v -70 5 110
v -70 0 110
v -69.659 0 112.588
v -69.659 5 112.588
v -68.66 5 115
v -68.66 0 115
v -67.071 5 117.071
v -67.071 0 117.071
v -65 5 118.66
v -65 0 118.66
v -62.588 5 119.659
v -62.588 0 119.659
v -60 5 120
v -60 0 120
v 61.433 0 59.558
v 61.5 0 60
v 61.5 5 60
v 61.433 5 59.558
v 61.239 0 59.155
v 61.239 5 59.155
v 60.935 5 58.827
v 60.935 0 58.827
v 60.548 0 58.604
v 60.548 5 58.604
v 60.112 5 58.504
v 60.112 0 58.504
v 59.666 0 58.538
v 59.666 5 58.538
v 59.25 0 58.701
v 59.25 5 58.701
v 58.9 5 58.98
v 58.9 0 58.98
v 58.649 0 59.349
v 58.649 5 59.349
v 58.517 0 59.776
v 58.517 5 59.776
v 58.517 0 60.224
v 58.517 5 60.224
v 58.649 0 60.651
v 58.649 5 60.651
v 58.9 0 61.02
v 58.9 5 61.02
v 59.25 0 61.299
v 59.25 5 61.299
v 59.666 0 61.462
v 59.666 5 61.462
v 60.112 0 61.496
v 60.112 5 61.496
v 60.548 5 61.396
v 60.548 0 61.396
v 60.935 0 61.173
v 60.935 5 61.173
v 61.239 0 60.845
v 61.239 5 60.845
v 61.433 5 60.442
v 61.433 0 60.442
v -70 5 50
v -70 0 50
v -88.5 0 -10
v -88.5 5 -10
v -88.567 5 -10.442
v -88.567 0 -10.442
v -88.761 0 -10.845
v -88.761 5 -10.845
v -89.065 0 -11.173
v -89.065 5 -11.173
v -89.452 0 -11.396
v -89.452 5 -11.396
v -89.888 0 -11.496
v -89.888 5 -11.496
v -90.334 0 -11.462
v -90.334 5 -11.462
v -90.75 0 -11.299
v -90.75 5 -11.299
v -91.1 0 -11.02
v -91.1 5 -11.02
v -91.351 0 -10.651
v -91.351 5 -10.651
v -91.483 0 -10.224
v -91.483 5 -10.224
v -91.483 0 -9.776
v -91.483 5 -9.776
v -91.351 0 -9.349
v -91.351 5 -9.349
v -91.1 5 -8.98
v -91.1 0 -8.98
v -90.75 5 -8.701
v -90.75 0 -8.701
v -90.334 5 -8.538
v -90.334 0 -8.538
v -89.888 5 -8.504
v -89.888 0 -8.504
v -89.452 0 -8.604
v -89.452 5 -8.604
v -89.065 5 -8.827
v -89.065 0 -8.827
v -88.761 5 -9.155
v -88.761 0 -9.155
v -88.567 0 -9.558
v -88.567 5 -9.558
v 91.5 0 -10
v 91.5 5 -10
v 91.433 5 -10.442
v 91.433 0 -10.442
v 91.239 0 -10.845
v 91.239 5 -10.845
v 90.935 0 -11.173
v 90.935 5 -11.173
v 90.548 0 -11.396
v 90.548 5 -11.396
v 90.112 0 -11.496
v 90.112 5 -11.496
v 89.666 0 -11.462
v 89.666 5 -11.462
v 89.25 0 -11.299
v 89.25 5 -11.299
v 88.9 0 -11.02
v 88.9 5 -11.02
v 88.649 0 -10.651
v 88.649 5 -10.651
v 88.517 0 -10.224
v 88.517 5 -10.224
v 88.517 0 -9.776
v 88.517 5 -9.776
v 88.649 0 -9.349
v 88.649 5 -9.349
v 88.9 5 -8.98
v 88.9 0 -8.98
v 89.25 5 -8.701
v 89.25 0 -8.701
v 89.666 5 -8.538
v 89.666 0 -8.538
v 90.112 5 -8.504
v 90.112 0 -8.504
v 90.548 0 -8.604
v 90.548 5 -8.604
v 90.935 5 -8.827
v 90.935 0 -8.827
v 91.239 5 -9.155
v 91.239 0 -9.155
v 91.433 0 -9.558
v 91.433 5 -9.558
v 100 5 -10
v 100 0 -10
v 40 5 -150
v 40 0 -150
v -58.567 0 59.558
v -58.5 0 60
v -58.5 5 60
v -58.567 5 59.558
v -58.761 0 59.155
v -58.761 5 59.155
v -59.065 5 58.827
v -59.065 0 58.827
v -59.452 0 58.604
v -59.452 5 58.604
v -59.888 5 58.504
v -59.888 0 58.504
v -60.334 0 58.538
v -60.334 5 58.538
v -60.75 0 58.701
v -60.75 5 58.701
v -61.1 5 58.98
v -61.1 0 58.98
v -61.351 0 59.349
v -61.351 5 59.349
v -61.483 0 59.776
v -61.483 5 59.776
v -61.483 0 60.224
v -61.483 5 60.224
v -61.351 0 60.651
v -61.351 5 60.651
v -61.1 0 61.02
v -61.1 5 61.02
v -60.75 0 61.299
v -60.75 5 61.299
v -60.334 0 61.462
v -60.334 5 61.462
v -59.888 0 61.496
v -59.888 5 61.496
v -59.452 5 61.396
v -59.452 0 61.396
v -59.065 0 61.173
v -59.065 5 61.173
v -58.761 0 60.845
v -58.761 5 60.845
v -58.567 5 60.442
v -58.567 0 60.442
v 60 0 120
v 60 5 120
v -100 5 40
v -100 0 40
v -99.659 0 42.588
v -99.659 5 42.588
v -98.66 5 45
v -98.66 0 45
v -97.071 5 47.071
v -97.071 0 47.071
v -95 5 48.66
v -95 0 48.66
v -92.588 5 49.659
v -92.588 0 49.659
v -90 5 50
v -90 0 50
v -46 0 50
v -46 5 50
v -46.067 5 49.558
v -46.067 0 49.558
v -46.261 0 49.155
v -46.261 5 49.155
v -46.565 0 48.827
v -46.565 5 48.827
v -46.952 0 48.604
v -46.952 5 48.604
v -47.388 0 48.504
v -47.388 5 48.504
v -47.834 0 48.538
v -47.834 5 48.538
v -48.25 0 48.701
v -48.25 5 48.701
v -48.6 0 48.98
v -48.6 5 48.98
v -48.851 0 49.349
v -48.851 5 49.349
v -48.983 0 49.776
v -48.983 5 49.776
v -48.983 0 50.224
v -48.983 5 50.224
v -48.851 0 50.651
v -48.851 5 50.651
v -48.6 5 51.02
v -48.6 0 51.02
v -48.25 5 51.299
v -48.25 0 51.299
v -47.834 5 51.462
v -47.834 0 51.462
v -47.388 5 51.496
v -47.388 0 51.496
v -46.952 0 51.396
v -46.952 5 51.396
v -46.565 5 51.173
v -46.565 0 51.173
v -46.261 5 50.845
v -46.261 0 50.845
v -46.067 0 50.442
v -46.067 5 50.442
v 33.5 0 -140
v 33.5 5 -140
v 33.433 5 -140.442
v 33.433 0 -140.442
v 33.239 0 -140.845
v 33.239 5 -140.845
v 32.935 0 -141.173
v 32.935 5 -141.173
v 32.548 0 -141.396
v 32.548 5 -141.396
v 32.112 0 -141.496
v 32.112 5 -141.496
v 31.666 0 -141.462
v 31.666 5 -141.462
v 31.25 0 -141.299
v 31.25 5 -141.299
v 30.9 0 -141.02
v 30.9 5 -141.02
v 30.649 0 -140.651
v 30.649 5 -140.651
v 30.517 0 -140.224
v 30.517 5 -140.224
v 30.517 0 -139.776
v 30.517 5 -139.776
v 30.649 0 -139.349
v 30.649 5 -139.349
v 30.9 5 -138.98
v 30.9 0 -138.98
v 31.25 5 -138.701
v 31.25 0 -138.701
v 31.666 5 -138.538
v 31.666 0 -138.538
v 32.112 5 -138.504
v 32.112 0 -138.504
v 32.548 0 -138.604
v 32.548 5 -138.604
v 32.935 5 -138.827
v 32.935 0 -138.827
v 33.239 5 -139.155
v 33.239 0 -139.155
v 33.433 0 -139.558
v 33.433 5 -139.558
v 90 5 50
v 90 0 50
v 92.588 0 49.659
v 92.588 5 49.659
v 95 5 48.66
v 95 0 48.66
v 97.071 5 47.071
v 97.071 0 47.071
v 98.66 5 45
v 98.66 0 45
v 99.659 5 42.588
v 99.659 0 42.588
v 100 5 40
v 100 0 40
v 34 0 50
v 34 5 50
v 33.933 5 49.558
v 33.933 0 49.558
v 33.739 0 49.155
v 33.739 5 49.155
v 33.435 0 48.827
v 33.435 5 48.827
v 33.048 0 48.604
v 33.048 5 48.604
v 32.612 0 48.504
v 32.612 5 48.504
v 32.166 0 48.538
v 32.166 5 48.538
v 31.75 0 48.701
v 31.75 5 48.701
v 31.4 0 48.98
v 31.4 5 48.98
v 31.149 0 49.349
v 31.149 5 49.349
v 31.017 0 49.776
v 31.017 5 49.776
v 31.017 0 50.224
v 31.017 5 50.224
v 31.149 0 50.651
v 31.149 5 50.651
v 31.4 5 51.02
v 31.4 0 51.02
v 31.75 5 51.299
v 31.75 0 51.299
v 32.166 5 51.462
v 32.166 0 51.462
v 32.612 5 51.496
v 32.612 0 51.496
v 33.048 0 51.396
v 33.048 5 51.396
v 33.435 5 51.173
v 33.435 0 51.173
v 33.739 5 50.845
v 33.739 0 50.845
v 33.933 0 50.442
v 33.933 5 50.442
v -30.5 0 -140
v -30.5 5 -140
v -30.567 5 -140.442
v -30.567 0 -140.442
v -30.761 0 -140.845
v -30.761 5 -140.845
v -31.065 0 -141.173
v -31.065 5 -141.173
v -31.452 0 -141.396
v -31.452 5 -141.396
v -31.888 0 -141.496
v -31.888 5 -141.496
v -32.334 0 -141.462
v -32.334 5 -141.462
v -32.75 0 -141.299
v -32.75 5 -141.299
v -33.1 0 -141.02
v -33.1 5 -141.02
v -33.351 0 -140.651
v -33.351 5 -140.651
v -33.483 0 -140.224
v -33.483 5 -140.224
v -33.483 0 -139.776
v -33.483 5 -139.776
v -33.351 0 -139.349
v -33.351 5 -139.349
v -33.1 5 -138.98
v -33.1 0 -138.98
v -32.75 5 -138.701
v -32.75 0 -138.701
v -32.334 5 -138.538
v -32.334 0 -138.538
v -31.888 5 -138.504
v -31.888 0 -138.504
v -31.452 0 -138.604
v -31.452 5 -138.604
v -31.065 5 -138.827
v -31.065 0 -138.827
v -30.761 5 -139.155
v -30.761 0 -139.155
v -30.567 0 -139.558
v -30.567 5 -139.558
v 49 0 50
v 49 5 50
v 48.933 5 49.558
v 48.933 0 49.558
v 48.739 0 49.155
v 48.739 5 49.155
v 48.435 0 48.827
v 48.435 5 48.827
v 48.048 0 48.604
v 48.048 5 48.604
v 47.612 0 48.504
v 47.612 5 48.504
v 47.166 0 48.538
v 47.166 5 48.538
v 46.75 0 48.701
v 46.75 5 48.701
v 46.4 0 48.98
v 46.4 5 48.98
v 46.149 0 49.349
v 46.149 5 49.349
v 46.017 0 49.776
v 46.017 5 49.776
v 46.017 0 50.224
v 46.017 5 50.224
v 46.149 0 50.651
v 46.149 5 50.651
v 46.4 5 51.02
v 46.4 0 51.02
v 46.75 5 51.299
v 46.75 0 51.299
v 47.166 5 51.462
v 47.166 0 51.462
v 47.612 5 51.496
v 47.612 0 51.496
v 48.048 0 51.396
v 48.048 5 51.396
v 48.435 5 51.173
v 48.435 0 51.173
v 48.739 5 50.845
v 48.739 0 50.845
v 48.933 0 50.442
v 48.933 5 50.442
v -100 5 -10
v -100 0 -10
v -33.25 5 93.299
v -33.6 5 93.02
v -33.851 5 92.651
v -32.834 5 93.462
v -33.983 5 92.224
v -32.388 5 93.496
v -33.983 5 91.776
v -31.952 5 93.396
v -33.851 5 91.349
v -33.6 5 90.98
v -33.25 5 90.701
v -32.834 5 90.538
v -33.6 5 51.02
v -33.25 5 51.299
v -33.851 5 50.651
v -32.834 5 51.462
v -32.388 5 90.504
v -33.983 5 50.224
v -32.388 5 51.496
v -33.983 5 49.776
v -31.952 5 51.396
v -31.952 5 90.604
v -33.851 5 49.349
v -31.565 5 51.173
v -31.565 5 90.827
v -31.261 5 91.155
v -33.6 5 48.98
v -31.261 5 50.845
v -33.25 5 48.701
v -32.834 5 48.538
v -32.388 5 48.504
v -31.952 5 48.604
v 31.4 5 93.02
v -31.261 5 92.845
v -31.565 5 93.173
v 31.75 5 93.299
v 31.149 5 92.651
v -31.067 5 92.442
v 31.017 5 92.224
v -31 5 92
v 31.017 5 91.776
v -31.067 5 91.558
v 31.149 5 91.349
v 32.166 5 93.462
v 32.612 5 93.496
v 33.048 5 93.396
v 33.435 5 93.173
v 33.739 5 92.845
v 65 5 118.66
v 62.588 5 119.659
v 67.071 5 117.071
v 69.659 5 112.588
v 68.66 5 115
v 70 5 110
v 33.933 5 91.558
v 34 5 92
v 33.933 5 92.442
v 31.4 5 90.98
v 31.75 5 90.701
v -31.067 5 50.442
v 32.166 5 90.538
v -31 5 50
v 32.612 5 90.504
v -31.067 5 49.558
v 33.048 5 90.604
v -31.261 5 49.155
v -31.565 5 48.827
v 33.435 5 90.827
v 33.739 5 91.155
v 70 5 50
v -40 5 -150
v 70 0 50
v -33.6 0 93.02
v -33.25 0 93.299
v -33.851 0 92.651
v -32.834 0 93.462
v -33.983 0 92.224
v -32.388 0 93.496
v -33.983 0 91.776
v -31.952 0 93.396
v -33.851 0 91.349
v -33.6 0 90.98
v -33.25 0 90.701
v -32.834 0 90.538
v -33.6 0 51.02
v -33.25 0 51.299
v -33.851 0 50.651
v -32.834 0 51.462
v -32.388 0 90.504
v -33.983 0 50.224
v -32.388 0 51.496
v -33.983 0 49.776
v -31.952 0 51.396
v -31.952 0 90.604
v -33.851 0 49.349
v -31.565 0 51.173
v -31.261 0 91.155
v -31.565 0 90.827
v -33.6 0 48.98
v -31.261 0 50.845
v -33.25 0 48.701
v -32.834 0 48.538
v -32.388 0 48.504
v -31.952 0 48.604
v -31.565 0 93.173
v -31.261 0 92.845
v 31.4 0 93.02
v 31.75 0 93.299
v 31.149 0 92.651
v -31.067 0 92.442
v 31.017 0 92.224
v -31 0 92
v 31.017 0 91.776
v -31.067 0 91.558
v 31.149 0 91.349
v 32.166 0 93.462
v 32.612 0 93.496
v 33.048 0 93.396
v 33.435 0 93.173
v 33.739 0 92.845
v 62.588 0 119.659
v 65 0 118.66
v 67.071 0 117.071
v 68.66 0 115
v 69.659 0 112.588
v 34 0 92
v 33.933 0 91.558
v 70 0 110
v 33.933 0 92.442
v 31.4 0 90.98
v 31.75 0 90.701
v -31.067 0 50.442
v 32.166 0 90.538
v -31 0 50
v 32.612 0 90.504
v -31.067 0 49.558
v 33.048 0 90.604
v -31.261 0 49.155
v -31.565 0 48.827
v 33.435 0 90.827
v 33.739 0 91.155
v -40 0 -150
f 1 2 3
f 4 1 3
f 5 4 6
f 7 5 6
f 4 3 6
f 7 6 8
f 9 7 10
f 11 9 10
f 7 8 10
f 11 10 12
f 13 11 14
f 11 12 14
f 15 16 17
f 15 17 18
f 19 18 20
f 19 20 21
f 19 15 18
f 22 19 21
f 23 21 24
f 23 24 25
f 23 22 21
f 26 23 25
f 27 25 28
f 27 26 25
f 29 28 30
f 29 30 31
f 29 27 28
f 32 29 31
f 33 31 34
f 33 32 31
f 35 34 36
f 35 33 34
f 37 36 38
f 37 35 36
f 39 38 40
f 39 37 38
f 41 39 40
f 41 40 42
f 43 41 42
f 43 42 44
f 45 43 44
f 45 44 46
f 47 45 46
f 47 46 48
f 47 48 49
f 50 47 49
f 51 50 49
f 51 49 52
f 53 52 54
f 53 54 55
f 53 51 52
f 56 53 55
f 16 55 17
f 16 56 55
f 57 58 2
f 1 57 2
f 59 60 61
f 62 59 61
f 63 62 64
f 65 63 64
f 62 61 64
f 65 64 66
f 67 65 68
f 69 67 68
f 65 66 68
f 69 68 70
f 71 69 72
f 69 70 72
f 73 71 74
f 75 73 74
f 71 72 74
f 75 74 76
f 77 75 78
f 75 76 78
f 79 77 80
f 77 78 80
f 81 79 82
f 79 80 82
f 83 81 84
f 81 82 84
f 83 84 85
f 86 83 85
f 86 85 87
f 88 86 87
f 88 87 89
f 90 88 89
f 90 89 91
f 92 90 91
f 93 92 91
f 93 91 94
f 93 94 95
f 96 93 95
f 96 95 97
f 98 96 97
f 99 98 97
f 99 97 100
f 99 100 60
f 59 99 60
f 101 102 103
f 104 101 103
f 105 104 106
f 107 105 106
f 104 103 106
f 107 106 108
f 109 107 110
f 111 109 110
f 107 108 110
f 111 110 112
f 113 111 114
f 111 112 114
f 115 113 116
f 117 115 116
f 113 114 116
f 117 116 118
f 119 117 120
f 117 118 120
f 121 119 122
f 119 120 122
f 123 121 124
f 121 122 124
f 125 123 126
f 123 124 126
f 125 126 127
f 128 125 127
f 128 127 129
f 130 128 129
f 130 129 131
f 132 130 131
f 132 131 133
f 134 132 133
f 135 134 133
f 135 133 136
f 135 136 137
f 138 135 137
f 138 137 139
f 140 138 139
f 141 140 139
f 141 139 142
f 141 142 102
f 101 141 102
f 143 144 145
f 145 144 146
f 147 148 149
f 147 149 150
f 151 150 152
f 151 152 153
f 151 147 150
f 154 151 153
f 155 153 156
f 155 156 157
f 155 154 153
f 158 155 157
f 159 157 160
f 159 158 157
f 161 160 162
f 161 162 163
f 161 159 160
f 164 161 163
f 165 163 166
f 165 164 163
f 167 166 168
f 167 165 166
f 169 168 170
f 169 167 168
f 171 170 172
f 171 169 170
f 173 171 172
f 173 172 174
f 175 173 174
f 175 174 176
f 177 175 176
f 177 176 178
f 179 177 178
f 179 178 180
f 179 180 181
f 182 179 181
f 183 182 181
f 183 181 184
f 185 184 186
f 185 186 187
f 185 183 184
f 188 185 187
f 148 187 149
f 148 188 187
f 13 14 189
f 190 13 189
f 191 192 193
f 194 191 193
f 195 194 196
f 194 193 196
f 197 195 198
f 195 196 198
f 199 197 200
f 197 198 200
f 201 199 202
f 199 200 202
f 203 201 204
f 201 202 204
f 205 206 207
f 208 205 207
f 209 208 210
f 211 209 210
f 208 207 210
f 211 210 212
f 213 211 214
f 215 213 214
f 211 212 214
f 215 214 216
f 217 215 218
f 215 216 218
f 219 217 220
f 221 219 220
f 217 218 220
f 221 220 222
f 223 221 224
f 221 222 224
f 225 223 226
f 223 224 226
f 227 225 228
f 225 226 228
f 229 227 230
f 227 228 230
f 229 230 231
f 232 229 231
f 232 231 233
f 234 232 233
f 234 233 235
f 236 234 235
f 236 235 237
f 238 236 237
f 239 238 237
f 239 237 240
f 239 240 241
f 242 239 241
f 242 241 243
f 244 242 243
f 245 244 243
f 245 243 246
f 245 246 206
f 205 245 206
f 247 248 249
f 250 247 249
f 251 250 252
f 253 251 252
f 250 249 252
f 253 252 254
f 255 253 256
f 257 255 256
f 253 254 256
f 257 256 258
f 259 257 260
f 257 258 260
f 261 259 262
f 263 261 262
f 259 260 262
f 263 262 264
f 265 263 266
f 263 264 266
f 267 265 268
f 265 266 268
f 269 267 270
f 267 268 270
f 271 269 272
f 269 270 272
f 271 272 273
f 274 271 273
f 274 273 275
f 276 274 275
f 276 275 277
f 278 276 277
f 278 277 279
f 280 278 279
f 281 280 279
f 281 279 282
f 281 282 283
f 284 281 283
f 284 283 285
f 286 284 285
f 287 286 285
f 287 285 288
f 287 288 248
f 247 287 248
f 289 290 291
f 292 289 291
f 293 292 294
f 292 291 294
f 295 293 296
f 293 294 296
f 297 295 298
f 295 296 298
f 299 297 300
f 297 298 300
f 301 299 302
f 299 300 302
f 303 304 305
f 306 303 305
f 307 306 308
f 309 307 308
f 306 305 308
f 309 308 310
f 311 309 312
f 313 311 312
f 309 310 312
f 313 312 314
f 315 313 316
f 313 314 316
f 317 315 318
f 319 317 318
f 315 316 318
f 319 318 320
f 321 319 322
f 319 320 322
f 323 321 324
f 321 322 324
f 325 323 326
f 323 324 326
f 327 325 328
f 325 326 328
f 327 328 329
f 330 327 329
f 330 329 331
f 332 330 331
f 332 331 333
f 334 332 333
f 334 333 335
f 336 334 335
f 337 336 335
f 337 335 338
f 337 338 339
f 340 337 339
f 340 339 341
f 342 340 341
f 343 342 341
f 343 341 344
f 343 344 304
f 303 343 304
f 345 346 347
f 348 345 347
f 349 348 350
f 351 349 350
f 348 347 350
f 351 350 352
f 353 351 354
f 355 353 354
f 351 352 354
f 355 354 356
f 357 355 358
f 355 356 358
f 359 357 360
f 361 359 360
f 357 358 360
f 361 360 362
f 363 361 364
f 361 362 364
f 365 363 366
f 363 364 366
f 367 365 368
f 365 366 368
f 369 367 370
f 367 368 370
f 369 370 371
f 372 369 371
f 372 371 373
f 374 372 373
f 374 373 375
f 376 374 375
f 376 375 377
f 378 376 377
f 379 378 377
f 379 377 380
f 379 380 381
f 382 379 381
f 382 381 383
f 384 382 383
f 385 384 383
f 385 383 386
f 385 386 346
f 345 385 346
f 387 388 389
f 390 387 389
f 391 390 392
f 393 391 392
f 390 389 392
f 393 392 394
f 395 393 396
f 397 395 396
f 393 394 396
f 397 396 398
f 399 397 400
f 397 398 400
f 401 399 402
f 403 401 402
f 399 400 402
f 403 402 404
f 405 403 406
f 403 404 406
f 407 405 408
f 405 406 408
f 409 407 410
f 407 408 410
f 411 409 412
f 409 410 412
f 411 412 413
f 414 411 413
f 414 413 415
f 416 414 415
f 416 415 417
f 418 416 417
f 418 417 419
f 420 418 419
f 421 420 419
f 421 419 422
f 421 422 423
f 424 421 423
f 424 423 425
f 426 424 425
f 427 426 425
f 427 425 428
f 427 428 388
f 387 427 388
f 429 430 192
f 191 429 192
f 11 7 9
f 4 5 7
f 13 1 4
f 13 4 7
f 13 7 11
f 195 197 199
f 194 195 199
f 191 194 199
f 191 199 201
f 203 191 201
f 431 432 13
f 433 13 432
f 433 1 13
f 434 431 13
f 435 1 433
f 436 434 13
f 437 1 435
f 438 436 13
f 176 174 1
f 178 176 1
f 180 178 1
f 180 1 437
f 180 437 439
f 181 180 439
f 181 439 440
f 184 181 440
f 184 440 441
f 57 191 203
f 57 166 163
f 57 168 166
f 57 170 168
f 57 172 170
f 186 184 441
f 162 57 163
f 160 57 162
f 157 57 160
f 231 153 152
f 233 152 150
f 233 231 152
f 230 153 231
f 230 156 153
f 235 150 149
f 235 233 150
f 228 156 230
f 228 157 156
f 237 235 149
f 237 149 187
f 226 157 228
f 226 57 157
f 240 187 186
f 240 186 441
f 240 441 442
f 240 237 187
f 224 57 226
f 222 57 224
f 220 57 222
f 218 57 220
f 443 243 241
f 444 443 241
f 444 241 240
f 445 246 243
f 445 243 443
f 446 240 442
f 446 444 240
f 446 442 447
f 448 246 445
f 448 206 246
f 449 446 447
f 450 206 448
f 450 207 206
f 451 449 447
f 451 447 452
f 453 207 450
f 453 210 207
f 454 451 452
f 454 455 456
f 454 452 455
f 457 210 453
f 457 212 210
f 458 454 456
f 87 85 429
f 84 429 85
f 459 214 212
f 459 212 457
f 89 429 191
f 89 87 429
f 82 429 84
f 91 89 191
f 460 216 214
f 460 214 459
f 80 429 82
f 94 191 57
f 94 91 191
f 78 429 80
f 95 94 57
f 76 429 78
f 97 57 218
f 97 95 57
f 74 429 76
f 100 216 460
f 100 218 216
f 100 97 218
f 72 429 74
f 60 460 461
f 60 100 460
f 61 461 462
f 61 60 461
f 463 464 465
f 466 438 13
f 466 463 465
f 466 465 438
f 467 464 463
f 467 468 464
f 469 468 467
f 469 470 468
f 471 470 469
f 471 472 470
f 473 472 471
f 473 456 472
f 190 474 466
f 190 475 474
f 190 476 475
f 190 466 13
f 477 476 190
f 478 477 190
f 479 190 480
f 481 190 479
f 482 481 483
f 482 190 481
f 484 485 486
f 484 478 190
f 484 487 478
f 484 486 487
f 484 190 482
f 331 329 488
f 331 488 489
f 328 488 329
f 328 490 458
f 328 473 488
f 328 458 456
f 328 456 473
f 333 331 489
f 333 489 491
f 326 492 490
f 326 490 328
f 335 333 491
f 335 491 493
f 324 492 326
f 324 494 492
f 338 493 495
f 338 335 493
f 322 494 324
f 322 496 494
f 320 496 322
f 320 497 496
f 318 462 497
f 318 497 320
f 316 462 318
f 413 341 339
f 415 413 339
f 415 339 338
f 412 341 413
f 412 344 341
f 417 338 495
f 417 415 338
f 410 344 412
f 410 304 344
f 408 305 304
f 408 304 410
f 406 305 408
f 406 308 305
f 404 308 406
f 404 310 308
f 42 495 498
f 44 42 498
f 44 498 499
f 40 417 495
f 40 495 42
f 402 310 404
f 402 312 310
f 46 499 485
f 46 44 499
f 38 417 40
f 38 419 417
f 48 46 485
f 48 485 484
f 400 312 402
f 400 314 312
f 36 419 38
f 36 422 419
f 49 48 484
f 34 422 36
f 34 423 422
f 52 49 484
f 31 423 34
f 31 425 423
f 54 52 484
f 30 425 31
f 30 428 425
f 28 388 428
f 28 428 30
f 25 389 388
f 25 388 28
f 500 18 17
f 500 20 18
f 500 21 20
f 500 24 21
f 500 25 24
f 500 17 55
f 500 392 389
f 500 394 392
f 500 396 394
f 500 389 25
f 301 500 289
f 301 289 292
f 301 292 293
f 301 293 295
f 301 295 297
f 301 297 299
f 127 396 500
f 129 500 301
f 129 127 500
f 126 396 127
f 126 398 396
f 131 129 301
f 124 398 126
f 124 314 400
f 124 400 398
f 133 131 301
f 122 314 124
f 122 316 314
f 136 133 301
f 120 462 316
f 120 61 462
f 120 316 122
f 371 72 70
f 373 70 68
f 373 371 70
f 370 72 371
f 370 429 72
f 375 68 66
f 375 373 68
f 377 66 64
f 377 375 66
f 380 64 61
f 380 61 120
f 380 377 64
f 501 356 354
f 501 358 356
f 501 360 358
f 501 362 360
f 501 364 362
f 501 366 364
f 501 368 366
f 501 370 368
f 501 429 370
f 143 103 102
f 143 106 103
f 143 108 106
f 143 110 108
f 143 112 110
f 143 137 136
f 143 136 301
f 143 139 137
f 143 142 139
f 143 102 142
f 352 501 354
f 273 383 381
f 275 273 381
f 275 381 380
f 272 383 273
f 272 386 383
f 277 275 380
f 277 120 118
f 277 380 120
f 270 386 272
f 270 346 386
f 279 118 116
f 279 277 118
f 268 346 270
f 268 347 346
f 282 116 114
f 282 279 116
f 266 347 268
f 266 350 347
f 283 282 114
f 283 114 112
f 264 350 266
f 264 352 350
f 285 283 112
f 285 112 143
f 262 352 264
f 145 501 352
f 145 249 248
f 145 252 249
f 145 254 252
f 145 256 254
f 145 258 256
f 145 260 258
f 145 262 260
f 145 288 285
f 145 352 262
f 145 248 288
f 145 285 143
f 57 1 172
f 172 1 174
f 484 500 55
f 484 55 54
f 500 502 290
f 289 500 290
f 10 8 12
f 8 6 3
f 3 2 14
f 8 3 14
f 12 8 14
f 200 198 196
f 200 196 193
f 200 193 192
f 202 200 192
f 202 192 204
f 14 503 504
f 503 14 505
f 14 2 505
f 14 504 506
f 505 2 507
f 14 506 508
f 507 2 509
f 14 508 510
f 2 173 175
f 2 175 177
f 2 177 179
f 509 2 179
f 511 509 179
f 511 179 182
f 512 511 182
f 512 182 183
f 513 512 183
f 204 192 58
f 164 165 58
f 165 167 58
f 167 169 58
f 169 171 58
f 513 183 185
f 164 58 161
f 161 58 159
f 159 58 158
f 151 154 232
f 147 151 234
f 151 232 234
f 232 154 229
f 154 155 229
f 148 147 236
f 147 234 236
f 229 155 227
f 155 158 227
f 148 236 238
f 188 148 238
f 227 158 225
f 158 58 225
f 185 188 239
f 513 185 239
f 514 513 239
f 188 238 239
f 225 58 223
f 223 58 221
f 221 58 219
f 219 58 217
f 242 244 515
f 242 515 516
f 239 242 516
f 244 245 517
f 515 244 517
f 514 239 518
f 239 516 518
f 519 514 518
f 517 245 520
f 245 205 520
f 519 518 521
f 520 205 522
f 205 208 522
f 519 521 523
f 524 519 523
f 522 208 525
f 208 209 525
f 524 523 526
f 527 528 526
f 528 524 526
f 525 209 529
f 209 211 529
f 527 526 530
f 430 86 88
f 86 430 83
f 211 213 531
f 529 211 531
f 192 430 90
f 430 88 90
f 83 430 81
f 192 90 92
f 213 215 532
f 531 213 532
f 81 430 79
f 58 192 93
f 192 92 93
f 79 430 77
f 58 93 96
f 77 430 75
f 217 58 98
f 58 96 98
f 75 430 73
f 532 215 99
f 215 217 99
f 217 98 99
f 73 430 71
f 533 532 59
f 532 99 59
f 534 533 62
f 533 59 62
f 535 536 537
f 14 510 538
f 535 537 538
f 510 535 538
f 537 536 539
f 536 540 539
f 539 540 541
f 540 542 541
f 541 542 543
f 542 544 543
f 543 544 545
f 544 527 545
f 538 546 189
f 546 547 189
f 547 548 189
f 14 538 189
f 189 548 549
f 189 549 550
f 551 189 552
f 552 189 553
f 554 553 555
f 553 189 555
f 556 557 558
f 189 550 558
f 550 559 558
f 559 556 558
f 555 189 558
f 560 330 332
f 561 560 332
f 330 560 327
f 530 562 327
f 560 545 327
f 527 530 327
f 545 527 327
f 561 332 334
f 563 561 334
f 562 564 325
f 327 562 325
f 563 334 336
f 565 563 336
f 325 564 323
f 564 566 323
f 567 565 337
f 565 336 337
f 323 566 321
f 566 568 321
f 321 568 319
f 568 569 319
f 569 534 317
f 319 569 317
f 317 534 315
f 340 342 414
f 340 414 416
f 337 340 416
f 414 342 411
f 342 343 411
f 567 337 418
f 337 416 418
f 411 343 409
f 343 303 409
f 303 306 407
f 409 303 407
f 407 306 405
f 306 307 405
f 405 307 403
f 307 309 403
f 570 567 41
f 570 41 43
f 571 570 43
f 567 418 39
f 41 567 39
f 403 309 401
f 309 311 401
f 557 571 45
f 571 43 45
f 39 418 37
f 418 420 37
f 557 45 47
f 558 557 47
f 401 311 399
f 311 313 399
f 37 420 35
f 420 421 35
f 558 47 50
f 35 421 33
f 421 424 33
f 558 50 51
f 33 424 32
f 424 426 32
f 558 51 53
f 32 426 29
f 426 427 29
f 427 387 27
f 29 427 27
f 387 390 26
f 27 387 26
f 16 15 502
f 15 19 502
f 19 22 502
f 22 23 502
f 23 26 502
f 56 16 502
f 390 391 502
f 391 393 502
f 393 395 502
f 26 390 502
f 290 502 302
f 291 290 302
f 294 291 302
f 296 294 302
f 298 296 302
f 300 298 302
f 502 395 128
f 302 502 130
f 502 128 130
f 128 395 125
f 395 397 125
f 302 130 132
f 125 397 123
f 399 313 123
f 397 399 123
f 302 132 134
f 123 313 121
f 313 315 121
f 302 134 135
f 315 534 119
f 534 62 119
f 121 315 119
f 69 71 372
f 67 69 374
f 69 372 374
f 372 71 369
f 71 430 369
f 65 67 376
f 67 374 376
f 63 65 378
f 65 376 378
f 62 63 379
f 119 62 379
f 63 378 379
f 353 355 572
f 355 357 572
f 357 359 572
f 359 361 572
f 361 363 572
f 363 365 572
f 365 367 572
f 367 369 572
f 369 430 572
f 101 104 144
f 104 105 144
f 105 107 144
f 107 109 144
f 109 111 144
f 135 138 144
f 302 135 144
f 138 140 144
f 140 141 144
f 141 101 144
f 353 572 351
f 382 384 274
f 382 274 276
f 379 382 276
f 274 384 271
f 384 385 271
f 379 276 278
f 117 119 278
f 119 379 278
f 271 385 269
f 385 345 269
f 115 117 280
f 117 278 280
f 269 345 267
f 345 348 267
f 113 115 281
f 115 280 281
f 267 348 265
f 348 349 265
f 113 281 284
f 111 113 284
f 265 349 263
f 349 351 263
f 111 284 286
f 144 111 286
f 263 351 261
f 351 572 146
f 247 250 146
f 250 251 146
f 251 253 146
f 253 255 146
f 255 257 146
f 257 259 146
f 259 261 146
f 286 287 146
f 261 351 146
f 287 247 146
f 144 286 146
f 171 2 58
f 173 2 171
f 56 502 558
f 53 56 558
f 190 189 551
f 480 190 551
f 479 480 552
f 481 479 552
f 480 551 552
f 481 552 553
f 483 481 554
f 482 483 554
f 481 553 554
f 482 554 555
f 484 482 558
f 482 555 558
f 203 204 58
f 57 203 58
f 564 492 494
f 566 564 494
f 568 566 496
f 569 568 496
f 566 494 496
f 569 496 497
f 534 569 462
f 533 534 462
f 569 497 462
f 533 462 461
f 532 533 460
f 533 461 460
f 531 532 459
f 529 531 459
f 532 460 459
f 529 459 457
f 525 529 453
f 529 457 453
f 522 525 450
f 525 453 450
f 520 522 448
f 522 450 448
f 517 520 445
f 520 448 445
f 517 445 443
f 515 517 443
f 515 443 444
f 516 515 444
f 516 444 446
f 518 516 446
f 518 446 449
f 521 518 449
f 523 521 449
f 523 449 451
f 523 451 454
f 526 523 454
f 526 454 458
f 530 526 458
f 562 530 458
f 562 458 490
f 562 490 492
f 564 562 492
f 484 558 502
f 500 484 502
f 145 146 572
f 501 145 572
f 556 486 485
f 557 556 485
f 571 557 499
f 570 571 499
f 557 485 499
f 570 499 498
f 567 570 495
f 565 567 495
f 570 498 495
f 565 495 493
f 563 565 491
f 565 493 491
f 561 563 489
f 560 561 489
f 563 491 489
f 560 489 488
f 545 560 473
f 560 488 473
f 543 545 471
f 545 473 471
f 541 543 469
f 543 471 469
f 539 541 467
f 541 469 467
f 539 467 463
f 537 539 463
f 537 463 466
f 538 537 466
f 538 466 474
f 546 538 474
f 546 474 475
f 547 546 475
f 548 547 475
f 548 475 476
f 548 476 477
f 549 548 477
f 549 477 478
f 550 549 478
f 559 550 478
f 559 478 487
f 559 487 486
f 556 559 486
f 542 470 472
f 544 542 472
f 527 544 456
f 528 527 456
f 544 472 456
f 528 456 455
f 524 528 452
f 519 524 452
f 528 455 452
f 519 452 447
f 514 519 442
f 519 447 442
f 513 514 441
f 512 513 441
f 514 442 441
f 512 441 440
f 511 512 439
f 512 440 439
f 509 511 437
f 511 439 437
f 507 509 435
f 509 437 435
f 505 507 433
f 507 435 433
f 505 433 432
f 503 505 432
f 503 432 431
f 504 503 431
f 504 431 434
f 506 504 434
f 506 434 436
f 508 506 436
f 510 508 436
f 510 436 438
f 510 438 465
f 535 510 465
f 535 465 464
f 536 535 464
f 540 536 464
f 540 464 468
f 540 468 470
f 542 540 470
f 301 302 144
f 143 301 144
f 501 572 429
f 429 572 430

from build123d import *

# Parameters (mm, degrees)
SKETCH1_R           = 1.5
BOSS_EXTRUDE1_DEPTH = 5
SKETCH8_R           = 1.5
CUT_EXTRUDE5_DEPTH  = 10
SKETCH9_R           = 1.5
CUT_EXTRUDE6_DEPTH  = 10


with BuildPart() as part:
    # Sketch1 → Boss-Extrude1 (new body)
    with BuildSketch(Plane(origin=(0, 0, 0), x_dir=(1, 0, 0), z_dir=(0, 1, 0))):
        with BuildLine():
            Line((100, -40), (100, 10))
            Line((100, 10), (40, 150))
            Line((40, 150), (-40, 150))
            Line((-40, 150), (-100, 10))
            Line((-100, 10), (-100, -40))
            ThreePointArc((-100, -40), (-97.071067812, -47.071067812), (-90, -50))
            Line((-90, -50), (-70, -50))
            Line((-70, -50), (-70, -60))
            Line((-70, -60), (-70, -110))
            ThreePointArc((-70, -110), (-67.071067812, -117.071067812), (-60, -120))
            Line((-60, -120), (60, -120))
            ThreePointArc((60, -120), (67.071067812, -117.071067812), (70, -110))
            Line((70, -110), (70, -60))
            Line((70, -60), (70, -50))
            Line((70, -50), (90, -50))
            ThreePointArc((90, -50), (97.071067812, -47.071067812), (100, -40))
        make_face()
        with Locations((-60, -60)):
            Circle(SKETCH1_R, mode=Mode.SUBTRACT)
        with Locations((60, -60)):
            Circle(SKETCH1_R, mode=Mode.SUBTRACT)
    extrude(amount=BOSS_EXTRUDE1_DEPTH)

    # Sketch8 → Cut-Extrude5 (cut)
    with BuildSketch(Plane(origin=(0, 5, 0), x_dir=(1, 0, 0), z_dir=(0, 1, 0))):
        with Locations((-90, 10)):
            Circle(SKETCH8_R)
        with Locations((-32, 140)):
            Circle(SKETCH8_R)
        with Locations((90, 10)):
            Circle(SKETCH8_R)
        with Locations((32, 140)):
            Circle(SKETCH8_R)
    extrude(amount=-CUT_EXTRUDE5_DEPTH, mode=Mode.SUBTRACT)

    # Sketch9 → Cut-Extrude6 (cut)
    with BuildSketch(Plane(origin=(0, 5, 0), x_dir=(1, 0, 0), z_dir=(0, 1, 0))):
        with Locations((47.5, -50)):
            Circle(SKETCH9_R)
        with Locations((32.5, -50)):
            Circle(SKETCH9_R)
        with Locations((32.5, -92)):
            Circle(SKETCH9_R)
        with Locations((-32.5, -50)):
            Circle(SKETCH9_R)
        with Locations((-32.5, -92)):
            Circle(SKETCH9_R)
        with Locations((-47.5, -50)):
            Circle(SKETCH9_R)
    extrude(amount=-CUT_EXTRUDE6_DEPTH, mode=Mode.SUBTRACT)


solid = part.part
